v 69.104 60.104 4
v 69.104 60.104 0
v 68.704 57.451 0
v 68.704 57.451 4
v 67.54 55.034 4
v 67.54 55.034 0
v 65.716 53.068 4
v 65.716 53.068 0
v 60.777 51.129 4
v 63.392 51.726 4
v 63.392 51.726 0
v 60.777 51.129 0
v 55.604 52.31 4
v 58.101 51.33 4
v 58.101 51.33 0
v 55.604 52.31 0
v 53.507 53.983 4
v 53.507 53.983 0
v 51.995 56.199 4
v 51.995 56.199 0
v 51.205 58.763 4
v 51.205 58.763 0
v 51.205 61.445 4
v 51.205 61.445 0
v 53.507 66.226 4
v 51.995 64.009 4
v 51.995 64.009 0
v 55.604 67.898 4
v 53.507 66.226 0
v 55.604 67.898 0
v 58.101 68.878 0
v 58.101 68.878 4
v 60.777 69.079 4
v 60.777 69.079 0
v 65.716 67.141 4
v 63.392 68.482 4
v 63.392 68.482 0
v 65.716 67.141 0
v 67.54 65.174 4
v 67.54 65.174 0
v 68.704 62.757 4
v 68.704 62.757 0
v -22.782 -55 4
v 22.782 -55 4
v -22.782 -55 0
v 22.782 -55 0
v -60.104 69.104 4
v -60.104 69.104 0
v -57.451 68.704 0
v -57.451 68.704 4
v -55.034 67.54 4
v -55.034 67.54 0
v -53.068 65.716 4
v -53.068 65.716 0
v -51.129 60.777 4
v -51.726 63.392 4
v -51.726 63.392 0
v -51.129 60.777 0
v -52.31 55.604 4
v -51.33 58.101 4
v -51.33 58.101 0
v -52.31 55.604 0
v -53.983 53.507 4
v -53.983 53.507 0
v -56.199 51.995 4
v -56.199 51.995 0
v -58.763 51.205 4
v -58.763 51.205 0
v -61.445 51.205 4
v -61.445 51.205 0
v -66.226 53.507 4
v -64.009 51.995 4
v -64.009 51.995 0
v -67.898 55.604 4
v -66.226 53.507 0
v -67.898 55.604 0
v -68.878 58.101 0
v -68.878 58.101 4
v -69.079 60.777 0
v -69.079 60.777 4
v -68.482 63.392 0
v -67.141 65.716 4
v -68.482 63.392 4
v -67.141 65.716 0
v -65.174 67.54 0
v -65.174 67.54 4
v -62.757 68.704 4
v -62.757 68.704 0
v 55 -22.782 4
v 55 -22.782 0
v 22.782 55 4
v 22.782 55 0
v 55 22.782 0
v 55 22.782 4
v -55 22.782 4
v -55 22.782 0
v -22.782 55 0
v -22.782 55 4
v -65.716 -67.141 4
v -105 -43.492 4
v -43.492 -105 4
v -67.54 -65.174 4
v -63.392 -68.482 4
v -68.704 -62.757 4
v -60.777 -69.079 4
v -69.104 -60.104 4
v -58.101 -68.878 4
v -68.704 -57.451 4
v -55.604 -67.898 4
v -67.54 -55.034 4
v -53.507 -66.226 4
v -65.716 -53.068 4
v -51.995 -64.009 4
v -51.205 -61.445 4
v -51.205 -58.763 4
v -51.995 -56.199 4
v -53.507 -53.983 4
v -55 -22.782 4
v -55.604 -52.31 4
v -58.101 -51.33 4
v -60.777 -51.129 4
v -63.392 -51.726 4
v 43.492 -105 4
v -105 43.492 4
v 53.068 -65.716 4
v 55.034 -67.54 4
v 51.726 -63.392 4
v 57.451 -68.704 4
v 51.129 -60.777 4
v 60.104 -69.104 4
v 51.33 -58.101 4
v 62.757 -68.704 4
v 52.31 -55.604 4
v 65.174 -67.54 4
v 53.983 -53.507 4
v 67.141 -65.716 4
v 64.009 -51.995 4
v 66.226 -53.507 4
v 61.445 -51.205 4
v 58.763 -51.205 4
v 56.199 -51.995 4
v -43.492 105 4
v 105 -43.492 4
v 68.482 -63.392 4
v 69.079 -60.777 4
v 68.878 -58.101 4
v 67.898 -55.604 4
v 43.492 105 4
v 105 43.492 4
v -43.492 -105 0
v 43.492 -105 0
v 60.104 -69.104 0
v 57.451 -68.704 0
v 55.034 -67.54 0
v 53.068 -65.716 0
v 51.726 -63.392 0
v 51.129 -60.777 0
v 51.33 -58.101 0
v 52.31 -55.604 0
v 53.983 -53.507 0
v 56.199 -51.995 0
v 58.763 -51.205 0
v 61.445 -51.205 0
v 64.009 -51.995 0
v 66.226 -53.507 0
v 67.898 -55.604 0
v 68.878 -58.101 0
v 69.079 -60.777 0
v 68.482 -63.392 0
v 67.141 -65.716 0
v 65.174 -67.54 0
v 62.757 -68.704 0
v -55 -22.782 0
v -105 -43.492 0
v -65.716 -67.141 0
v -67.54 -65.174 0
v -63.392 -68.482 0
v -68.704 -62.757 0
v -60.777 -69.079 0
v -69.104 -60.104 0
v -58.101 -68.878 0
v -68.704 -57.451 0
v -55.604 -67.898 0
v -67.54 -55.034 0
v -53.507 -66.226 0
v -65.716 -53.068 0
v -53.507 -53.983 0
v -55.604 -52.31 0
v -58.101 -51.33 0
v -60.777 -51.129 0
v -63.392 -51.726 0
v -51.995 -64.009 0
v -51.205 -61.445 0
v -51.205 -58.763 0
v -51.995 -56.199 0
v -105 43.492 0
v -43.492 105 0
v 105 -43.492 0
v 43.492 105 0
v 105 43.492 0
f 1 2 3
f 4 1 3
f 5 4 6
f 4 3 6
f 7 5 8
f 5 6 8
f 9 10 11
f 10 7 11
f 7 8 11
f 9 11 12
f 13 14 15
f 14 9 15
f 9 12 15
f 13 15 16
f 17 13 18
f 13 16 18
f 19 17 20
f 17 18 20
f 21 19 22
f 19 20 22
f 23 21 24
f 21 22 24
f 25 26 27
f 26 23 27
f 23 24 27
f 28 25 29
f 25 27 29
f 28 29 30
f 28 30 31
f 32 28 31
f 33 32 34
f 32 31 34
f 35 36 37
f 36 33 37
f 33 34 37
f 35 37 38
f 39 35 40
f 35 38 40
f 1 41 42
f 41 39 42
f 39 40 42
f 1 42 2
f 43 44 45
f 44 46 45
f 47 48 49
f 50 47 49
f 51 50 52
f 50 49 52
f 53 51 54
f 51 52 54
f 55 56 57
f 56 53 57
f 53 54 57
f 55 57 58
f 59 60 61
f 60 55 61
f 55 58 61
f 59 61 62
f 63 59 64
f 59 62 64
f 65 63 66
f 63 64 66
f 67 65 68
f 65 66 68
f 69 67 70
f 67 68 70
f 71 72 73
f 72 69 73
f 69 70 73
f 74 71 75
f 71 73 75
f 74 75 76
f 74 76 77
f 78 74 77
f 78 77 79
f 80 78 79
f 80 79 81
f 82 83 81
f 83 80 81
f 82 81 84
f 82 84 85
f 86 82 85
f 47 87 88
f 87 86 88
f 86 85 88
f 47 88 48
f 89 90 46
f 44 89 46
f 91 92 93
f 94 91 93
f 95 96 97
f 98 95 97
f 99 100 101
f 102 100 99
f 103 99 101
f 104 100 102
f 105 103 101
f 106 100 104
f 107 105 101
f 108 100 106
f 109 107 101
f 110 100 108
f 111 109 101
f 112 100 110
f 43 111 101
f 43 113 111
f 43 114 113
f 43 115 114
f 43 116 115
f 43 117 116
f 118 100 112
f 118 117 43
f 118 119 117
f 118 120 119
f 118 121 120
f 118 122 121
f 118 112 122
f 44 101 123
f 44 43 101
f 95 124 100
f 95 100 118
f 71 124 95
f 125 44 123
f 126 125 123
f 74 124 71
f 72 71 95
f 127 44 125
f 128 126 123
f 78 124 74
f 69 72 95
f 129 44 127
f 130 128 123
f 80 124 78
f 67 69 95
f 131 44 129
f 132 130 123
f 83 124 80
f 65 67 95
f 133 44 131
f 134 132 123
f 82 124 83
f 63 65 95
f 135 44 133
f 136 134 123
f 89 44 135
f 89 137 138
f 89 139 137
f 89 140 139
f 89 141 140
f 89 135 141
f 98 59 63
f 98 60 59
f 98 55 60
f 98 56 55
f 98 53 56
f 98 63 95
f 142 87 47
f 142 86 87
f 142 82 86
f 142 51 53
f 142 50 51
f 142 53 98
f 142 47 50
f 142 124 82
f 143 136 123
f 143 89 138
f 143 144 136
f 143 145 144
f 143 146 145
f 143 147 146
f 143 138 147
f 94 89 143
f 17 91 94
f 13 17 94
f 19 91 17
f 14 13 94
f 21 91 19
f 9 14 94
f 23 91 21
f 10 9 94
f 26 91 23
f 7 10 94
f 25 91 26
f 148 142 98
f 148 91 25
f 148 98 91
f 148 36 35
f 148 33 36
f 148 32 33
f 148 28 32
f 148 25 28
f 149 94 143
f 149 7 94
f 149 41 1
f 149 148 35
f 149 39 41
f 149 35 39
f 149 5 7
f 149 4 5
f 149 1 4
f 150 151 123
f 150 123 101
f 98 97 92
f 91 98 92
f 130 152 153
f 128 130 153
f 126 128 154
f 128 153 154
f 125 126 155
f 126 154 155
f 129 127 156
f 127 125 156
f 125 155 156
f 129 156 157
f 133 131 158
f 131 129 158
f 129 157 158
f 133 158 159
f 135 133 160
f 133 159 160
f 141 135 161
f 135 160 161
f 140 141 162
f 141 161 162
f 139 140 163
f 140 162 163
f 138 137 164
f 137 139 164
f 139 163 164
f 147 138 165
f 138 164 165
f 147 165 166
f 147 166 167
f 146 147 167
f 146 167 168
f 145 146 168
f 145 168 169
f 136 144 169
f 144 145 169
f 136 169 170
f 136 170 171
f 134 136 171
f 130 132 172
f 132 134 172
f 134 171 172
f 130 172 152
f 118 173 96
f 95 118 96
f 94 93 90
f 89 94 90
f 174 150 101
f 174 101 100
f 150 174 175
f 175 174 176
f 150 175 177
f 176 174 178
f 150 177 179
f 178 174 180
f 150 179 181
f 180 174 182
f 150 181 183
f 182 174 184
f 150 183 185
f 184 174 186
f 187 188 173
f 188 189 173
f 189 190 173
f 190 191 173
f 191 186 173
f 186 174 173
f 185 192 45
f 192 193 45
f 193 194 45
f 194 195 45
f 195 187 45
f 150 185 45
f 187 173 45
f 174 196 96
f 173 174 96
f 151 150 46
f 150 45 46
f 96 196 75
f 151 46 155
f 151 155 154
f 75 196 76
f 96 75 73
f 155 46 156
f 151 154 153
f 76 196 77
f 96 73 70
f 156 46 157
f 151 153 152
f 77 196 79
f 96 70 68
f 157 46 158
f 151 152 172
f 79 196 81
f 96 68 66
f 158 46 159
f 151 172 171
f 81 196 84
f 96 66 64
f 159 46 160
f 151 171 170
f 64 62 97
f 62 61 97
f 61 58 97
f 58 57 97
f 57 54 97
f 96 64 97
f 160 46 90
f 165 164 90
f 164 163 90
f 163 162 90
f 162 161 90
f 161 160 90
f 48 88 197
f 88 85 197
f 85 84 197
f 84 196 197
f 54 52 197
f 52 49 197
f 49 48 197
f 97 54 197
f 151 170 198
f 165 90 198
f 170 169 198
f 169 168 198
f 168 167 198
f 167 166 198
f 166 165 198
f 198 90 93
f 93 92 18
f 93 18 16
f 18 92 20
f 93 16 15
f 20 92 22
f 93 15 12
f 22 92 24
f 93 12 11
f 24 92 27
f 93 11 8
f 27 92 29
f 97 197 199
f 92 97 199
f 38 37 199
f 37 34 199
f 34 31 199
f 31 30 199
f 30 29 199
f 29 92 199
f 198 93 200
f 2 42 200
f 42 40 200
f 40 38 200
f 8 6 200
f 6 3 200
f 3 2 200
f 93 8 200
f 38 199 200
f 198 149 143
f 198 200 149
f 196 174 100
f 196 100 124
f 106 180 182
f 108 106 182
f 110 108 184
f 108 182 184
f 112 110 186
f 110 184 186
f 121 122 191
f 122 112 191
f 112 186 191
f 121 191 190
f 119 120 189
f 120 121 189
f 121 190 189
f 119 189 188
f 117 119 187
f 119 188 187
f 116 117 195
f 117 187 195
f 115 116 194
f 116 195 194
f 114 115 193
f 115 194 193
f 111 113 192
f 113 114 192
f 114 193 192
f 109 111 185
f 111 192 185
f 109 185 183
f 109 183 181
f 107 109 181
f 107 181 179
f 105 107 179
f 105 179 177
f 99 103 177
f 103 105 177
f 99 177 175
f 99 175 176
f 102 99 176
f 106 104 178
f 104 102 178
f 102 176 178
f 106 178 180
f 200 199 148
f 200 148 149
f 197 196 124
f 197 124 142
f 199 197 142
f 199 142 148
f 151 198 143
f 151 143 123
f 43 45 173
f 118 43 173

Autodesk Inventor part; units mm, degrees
ref_plane "YZ Plane" through (0, 0, 0) normal (1, 0, 0) x (0, 1, 0)
ref_plane "XZ Plane" through (0, 0, 0) normal (0, 1, 0) x (-1, 0, 0)
ref_plane "XY Plane" through (0, 0, 0) normal (0, 0, 1) x (1, 0, 0)
sketch "Sketch1" plane through (0, 0, 0) normal (0, 0, 1) x (1, 0, 0)
  circle A0 centre (0, 0) radius 55 construction
  circle A1 centre (0, 0) radius 105 construction
  line L0 (105, -105) -> (-105, -105)
  line L1 (-105, -105) -> (-105, 105)
  line L2 (-105, 105) -> (105, 105)
  line L3 (105, 105) -> (105, -105)
  line L4 (105, -105) -> (-105, 105) construction
  line L5 (-105, -105) -> (105, 105) construction
  line L6 (43.4924, 105) -> (105, 43.4924)
  line L7 (105, 43.4924) -> (105, -43.4924)
  line L8 (105, -43.4924) -> (43.4924, -105)
  line L9 (43.4924, -105) -> (-43.4924, -105)
  line L10 (-43.4924, -105) -> (-105, -43.4924)
  line L11 (-105, -43.4924) -> (-105, 43.4924)
  line L12 (-105, 43.4924) -> (-43.4924, 105)
  line L13 (-43.4924, 105) -> (43.4924, 105)
  line L14 (22.7817, 55) -> (55, 22.7817)
  line L15 (55, 22.7817) -> (55, -22.7817)
  line L16 (55, -22.7817) -> (22.7817, -55)
  line L17 (22.7817, -55) -> (-22.7817, -55)
  line L18 (-22.7817, -55) -> (-55, -22.7817)
  line L19 (-55, -22.7817) -> (-55, 22.7817)
  line L20 (-55, 22.7817) -> (-22.7817, 55)
  line L21 (-22.7817, 55) -> (22.7817, 55)
  point P0 (0, 105)
  point P1 (-105, 43.4924)
  point P2 (-43.4924, -105)
  point P3 (0, 55)
  dimension "d22" = 110
  dimension "d23" = 210
extrude "Plate1" add sketch "Sketch1" along normal blind 4 contours L0 L10 L1 L12 L2 L6 L3 L8
sketch "Sketch6" plane through (0, 0, 0) normal (0, 0, 1) x (1, 0, 0)
  line L0 (0, 0) -> (0, 85) construction
  circle A0 centre (0, 0) radius 85 construction
  line L1 (0, 0) -> (60.1041, 60.1041) construction
  circle A1 centre (60.1041, 60.1041) radius 9
  dimension "d32" = 18
  dimension "d33" = 170
  dimension "d34" = 45
extrude "Cut2" cut sketch "Sketch6" along normal blind 4
pattern_circular "Circular Pattern2" count 4 over 360 about axis through (0, 0, -10) along (0, 0, 1) of "Cut2"
equation "\"d23\" = Flange_D_outer"
equation "\"d32\" = Flange_d_hole_diam"
equation "\"d33\" = Flange_D1_hole_center"
equation "\"d35\" = Thickness"
equation "\"d2\" = Thickness"
equation "\"BendReliefWidth\" = Thickness"
equation "\"BendReliefDepth\" = 0.5 * Thickness"
equation "\"CornerReliefSize\" = 4 * Thickness"
equation "\"MinimumRemnant\" = 2 * Thickness"
equation "\"TransitionRadius\" = BendRadius"
equation "\"JacobiRadiusSize\" = BendRadius"
equation "\"GapSize\" = Thickness"
equation "\"Flange_D_outer\" = 210"
equation "\"Flange_d_hole_diam\" = 18"
equation "\"Flange_D1_hole_center\" = 170"
equation "\"Thickness\" = 4"
equation "\"BendRadius\" = 6"
properties part number "DSB 110 drain sustem flange" material "Stainless Steel"
